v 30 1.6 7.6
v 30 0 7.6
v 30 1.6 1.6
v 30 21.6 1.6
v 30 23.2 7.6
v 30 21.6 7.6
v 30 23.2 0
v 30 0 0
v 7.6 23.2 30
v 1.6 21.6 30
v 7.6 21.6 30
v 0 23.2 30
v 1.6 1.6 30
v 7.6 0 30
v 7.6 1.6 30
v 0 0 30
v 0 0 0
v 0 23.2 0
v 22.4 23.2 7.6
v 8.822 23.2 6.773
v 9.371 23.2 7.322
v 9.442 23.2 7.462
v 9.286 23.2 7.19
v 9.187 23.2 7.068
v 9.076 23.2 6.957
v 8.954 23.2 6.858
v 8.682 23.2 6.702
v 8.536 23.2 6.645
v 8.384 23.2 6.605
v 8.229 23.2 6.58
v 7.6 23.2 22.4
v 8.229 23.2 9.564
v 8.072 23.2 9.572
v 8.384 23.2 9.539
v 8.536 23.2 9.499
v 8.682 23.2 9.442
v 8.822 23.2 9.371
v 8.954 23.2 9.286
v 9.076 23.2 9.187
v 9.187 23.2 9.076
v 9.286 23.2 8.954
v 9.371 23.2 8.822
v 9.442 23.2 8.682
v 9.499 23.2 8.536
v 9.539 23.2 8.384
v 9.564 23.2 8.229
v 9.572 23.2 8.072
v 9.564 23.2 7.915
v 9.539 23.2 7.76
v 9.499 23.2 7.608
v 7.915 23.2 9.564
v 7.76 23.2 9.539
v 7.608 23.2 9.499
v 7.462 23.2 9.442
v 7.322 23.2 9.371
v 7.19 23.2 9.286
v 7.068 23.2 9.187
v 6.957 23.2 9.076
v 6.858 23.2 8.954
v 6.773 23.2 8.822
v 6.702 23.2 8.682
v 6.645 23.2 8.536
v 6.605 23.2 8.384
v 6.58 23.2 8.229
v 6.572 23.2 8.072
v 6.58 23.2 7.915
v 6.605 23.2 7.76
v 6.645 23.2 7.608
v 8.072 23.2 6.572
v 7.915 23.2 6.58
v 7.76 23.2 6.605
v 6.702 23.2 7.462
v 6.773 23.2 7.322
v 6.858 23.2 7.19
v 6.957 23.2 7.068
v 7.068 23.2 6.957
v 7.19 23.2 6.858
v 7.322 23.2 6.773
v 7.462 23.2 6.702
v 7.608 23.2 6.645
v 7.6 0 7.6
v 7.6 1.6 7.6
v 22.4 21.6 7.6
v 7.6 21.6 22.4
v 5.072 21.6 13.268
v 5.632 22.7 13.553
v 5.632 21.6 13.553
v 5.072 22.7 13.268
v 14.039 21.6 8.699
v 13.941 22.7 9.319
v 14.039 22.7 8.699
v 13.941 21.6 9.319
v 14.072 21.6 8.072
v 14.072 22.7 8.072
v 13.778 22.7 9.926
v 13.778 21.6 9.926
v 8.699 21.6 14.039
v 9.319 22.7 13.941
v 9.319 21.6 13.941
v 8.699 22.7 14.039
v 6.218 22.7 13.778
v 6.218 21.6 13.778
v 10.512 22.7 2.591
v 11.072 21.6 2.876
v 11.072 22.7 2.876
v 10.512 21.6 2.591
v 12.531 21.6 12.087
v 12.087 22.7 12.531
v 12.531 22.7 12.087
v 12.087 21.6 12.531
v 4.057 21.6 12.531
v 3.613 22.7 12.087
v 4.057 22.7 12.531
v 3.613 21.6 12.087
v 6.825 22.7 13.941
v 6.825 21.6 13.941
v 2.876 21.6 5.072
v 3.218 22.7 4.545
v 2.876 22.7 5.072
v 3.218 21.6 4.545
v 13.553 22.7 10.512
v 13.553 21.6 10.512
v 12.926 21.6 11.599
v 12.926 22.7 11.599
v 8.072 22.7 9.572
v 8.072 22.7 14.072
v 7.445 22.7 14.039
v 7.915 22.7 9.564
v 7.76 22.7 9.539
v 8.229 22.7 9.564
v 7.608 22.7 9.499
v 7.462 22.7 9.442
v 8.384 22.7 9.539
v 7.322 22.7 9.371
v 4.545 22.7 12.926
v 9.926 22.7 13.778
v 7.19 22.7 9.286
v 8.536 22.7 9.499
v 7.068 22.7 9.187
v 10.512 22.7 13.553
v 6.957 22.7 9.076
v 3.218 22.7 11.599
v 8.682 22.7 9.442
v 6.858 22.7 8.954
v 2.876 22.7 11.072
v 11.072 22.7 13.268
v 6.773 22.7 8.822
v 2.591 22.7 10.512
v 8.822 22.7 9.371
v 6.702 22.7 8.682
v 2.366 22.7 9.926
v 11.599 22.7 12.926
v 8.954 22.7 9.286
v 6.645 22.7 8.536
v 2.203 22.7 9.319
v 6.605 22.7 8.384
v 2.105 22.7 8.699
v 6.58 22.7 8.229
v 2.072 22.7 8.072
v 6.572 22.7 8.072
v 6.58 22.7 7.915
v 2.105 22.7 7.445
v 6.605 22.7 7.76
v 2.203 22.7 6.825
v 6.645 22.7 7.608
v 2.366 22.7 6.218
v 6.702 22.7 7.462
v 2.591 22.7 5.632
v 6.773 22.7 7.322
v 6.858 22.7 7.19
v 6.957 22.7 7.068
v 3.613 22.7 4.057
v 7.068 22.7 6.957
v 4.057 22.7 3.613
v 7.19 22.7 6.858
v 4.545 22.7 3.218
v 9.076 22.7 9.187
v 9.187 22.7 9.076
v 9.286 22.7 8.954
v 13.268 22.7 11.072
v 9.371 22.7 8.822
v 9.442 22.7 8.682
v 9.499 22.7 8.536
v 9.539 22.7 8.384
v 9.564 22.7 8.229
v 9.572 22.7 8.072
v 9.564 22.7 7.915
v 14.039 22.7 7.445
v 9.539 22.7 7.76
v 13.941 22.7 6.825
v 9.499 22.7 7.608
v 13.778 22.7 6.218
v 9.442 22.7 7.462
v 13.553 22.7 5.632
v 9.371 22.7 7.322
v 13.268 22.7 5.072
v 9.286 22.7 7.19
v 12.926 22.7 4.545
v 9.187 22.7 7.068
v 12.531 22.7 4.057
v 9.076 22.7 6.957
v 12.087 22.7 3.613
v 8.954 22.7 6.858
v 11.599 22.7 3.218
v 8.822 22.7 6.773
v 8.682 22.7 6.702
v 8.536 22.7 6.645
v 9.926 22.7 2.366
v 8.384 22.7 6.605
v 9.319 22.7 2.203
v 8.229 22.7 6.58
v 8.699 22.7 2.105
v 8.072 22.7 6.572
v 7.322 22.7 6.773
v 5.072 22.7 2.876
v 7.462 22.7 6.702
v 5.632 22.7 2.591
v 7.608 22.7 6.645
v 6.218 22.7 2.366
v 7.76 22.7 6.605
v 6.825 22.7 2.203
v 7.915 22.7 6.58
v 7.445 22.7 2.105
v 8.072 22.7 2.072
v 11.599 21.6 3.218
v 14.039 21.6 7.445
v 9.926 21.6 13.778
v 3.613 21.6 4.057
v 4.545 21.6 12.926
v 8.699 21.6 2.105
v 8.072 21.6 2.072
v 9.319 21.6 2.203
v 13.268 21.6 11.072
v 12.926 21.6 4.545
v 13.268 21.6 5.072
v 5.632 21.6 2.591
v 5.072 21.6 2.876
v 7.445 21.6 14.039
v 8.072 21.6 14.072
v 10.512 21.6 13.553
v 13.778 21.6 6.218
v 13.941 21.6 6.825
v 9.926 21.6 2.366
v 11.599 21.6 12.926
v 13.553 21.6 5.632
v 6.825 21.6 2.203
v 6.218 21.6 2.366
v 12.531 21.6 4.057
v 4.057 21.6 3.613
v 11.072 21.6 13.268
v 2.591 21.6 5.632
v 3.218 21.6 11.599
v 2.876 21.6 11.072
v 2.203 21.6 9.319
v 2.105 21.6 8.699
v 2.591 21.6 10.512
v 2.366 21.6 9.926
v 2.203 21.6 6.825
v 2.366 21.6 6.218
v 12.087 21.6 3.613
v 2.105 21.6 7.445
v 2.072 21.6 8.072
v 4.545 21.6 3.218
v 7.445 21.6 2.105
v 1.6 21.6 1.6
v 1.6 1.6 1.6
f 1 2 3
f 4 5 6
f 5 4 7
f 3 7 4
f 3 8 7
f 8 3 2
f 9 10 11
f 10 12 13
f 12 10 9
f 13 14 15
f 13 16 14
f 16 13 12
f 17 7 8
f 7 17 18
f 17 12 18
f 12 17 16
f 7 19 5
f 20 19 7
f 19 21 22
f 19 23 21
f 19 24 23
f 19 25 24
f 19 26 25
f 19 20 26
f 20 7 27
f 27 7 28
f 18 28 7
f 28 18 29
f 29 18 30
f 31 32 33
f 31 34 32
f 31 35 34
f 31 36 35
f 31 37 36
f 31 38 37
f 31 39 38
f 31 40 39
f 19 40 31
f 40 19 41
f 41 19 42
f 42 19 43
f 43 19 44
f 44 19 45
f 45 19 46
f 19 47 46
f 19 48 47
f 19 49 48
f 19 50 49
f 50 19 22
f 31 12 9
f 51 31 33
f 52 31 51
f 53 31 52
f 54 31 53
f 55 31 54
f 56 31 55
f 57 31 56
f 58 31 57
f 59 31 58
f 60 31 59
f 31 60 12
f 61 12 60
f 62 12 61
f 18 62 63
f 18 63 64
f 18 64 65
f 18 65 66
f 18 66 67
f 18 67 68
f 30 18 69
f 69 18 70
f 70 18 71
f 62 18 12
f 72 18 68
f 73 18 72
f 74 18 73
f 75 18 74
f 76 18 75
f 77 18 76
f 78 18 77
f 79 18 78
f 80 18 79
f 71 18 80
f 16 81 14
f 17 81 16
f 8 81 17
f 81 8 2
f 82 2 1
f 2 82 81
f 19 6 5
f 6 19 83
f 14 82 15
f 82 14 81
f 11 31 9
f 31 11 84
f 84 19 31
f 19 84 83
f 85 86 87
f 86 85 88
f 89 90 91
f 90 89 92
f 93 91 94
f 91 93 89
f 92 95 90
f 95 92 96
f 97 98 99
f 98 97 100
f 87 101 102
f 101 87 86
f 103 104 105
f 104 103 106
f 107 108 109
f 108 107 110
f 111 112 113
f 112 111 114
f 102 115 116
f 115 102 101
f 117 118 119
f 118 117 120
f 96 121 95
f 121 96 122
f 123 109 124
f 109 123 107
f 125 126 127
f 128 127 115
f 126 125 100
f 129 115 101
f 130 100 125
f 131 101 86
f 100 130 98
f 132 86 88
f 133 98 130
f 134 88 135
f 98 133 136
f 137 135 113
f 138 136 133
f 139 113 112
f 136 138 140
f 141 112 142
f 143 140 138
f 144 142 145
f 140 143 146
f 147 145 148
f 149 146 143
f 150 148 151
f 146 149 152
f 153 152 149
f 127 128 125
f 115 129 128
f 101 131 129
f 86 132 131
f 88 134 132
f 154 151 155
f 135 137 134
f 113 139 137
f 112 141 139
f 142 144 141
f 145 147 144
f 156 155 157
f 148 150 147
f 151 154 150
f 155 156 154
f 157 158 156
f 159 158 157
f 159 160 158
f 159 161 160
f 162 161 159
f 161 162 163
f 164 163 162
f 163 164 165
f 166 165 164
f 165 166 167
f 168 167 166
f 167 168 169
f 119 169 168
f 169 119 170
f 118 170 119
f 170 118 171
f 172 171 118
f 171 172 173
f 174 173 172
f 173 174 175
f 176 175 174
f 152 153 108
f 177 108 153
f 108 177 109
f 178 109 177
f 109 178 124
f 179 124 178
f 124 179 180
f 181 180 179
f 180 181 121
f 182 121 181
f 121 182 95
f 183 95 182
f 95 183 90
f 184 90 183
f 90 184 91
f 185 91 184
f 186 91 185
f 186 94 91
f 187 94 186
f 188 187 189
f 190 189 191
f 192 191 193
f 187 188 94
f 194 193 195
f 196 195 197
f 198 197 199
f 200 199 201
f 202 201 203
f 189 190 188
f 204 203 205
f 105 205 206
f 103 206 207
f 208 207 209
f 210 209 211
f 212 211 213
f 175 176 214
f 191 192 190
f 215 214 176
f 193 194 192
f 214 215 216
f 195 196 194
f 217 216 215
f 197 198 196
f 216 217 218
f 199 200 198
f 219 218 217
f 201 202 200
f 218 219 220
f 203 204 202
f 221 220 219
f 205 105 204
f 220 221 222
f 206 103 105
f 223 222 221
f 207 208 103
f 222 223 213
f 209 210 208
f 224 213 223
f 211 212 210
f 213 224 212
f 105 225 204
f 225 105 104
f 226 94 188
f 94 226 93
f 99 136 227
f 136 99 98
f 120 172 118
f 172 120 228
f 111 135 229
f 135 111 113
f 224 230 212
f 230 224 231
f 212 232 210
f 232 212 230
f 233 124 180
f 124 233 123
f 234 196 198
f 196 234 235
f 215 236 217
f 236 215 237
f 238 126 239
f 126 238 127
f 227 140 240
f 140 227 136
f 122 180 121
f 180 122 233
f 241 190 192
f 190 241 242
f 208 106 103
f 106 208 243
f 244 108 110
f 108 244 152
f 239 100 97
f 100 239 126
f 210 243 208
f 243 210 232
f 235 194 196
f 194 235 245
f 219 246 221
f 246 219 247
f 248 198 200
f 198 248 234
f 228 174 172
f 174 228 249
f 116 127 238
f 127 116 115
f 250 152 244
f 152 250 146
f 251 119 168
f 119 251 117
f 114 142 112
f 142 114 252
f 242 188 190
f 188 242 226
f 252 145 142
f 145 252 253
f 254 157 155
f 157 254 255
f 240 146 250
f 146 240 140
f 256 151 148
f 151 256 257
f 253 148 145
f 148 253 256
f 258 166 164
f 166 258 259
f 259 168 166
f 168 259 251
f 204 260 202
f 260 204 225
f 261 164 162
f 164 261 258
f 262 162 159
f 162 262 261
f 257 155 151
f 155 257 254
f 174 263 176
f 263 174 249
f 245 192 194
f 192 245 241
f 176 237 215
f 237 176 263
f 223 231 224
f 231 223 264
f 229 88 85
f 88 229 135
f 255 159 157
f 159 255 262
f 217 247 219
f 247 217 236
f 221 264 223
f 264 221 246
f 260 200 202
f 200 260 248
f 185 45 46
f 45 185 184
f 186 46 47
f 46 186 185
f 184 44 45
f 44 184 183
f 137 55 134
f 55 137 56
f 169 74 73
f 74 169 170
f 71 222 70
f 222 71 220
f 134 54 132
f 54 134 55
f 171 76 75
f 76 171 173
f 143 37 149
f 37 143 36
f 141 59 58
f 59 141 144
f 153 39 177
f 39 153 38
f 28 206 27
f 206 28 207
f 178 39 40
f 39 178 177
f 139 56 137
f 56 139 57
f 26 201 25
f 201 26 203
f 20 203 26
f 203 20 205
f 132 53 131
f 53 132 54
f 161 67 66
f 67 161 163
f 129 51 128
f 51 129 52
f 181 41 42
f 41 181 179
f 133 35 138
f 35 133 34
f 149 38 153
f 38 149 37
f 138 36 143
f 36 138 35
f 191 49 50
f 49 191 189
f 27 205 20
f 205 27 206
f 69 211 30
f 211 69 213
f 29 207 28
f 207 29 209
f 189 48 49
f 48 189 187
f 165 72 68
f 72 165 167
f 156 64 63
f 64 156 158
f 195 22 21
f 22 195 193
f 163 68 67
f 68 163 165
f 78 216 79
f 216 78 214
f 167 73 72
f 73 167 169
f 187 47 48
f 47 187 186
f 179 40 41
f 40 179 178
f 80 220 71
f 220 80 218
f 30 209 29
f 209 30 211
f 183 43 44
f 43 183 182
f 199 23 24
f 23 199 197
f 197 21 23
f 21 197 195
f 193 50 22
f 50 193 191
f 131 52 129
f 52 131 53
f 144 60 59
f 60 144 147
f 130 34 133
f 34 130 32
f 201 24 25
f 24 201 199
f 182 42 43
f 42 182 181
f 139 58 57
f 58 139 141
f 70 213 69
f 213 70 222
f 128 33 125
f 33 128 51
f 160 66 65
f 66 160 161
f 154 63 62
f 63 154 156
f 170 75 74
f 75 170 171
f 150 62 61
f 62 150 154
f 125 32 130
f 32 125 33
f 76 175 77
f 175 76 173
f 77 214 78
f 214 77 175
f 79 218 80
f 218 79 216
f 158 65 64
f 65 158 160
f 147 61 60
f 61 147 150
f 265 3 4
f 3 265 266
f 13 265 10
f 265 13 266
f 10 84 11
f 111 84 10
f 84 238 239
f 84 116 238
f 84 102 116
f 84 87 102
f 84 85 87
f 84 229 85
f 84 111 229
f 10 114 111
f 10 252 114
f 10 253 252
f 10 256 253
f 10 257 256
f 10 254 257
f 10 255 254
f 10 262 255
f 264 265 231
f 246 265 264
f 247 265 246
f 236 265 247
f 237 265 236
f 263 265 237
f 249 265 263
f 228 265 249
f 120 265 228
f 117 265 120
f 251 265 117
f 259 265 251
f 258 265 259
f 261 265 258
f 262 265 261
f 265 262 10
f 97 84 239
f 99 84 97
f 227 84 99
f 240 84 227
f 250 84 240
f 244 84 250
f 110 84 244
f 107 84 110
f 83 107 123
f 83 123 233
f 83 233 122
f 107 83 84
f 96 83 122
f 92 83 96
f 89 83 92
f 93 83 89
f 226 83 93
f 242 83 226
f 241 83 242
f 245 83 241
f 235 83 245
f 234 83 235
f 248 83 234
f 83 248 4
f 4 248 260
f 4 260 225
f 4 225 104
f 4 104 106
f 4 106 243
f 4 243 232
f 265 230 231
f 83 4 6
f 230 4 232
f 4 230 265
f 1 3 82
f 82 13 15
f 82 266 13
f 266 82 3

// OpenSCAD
// resolution of round corners, holes
$fn = 60;

// width of the bracket. Normally it should be set to a value smaller than half the length of object you want to hang
width = 30;
// height of the bracket. Normally it should be set to a value smaller than half the height of the object you want to hang
height = 30;
// the depth of our bracket, also equal thickness of the object you want to hang
depth = 20;

// thick ness of bracket's wall. A multiple of your nozzle width (line width) is best.
wall_thickness = 1.6;

// holding length: length of the part that hold your object
hold_length = 6;

// bolt diameter
bolt_dia = 3;
// bolt type
bolt_type = "chamfered"; // "countersunk" or "chamfered"

// hidden
// calculated values
outter_width = width;
outter_height = height;
outter_depth = depth + wall_thickness*2;
inner_depth = depth;

// main body
difference() {
    union() {
        difference() {
            cube([outter_width, outter_depth, outter_height]);
            // cut out holder
            holder_trans_dist = hold_length + wall_thickness;
            color("green")
                translate([holder_trans_dist, 0, holder_trans_dist])
                cube([outter_width, outter_depth, outter_height]);
        }
        rotate([0,0,90])
            translate([wall_thickness*2,-width,0])
            prism(inner_depth, width, height);
    }
    // cut out the inner portion to create a shell
    color("red")
        translate([wall_thickness, wall_thickness, wall_thickness])
        cube([width, inner_depth, height]);
    // cut out bolt hole(s)
    color("blue")
        translate([4*1.618 + wall_thickness, outter_depth - wall_thickness*(0.75/2)-0.1, 4*1.618 + wall_thickness])
        rotate([90, 0, 0])
        bolt(bolt_type, bolt_dia);
}

// create cavity for the bolt
module bolt(bolt_type, bolt_dia) {
    // Constants
    chamfer=4;
    gr=1.618;
    if (bolt_type == "chamfered") {
        translate([0, 0, wall_thickness*0.25])
            cylinder(d=bolt_dia*chamfer, h=wall_thickness*0.75, center=true);
        cylinder(d=bolt_dia, h=wall_thickness, center=true);
    } else if (bolt_type == "countersunk") {
        cylinder(d1=bolt_dia, d2=bolt_dia*chamfer, h=wall_thickness, center=true);
    }
}

// this module create a right triangular prism
module prism(l, w, h) {
    polyhedron(
        points=[[0,0,0], [l,0,0], [l,w,0], [0,w,0], [0,w,h], [l,w,h]],
        faces=[[0,1,2,3],[5,4,3,2],[0,4,5,1],[0,3,4],[5,2,1]]
    );
}
